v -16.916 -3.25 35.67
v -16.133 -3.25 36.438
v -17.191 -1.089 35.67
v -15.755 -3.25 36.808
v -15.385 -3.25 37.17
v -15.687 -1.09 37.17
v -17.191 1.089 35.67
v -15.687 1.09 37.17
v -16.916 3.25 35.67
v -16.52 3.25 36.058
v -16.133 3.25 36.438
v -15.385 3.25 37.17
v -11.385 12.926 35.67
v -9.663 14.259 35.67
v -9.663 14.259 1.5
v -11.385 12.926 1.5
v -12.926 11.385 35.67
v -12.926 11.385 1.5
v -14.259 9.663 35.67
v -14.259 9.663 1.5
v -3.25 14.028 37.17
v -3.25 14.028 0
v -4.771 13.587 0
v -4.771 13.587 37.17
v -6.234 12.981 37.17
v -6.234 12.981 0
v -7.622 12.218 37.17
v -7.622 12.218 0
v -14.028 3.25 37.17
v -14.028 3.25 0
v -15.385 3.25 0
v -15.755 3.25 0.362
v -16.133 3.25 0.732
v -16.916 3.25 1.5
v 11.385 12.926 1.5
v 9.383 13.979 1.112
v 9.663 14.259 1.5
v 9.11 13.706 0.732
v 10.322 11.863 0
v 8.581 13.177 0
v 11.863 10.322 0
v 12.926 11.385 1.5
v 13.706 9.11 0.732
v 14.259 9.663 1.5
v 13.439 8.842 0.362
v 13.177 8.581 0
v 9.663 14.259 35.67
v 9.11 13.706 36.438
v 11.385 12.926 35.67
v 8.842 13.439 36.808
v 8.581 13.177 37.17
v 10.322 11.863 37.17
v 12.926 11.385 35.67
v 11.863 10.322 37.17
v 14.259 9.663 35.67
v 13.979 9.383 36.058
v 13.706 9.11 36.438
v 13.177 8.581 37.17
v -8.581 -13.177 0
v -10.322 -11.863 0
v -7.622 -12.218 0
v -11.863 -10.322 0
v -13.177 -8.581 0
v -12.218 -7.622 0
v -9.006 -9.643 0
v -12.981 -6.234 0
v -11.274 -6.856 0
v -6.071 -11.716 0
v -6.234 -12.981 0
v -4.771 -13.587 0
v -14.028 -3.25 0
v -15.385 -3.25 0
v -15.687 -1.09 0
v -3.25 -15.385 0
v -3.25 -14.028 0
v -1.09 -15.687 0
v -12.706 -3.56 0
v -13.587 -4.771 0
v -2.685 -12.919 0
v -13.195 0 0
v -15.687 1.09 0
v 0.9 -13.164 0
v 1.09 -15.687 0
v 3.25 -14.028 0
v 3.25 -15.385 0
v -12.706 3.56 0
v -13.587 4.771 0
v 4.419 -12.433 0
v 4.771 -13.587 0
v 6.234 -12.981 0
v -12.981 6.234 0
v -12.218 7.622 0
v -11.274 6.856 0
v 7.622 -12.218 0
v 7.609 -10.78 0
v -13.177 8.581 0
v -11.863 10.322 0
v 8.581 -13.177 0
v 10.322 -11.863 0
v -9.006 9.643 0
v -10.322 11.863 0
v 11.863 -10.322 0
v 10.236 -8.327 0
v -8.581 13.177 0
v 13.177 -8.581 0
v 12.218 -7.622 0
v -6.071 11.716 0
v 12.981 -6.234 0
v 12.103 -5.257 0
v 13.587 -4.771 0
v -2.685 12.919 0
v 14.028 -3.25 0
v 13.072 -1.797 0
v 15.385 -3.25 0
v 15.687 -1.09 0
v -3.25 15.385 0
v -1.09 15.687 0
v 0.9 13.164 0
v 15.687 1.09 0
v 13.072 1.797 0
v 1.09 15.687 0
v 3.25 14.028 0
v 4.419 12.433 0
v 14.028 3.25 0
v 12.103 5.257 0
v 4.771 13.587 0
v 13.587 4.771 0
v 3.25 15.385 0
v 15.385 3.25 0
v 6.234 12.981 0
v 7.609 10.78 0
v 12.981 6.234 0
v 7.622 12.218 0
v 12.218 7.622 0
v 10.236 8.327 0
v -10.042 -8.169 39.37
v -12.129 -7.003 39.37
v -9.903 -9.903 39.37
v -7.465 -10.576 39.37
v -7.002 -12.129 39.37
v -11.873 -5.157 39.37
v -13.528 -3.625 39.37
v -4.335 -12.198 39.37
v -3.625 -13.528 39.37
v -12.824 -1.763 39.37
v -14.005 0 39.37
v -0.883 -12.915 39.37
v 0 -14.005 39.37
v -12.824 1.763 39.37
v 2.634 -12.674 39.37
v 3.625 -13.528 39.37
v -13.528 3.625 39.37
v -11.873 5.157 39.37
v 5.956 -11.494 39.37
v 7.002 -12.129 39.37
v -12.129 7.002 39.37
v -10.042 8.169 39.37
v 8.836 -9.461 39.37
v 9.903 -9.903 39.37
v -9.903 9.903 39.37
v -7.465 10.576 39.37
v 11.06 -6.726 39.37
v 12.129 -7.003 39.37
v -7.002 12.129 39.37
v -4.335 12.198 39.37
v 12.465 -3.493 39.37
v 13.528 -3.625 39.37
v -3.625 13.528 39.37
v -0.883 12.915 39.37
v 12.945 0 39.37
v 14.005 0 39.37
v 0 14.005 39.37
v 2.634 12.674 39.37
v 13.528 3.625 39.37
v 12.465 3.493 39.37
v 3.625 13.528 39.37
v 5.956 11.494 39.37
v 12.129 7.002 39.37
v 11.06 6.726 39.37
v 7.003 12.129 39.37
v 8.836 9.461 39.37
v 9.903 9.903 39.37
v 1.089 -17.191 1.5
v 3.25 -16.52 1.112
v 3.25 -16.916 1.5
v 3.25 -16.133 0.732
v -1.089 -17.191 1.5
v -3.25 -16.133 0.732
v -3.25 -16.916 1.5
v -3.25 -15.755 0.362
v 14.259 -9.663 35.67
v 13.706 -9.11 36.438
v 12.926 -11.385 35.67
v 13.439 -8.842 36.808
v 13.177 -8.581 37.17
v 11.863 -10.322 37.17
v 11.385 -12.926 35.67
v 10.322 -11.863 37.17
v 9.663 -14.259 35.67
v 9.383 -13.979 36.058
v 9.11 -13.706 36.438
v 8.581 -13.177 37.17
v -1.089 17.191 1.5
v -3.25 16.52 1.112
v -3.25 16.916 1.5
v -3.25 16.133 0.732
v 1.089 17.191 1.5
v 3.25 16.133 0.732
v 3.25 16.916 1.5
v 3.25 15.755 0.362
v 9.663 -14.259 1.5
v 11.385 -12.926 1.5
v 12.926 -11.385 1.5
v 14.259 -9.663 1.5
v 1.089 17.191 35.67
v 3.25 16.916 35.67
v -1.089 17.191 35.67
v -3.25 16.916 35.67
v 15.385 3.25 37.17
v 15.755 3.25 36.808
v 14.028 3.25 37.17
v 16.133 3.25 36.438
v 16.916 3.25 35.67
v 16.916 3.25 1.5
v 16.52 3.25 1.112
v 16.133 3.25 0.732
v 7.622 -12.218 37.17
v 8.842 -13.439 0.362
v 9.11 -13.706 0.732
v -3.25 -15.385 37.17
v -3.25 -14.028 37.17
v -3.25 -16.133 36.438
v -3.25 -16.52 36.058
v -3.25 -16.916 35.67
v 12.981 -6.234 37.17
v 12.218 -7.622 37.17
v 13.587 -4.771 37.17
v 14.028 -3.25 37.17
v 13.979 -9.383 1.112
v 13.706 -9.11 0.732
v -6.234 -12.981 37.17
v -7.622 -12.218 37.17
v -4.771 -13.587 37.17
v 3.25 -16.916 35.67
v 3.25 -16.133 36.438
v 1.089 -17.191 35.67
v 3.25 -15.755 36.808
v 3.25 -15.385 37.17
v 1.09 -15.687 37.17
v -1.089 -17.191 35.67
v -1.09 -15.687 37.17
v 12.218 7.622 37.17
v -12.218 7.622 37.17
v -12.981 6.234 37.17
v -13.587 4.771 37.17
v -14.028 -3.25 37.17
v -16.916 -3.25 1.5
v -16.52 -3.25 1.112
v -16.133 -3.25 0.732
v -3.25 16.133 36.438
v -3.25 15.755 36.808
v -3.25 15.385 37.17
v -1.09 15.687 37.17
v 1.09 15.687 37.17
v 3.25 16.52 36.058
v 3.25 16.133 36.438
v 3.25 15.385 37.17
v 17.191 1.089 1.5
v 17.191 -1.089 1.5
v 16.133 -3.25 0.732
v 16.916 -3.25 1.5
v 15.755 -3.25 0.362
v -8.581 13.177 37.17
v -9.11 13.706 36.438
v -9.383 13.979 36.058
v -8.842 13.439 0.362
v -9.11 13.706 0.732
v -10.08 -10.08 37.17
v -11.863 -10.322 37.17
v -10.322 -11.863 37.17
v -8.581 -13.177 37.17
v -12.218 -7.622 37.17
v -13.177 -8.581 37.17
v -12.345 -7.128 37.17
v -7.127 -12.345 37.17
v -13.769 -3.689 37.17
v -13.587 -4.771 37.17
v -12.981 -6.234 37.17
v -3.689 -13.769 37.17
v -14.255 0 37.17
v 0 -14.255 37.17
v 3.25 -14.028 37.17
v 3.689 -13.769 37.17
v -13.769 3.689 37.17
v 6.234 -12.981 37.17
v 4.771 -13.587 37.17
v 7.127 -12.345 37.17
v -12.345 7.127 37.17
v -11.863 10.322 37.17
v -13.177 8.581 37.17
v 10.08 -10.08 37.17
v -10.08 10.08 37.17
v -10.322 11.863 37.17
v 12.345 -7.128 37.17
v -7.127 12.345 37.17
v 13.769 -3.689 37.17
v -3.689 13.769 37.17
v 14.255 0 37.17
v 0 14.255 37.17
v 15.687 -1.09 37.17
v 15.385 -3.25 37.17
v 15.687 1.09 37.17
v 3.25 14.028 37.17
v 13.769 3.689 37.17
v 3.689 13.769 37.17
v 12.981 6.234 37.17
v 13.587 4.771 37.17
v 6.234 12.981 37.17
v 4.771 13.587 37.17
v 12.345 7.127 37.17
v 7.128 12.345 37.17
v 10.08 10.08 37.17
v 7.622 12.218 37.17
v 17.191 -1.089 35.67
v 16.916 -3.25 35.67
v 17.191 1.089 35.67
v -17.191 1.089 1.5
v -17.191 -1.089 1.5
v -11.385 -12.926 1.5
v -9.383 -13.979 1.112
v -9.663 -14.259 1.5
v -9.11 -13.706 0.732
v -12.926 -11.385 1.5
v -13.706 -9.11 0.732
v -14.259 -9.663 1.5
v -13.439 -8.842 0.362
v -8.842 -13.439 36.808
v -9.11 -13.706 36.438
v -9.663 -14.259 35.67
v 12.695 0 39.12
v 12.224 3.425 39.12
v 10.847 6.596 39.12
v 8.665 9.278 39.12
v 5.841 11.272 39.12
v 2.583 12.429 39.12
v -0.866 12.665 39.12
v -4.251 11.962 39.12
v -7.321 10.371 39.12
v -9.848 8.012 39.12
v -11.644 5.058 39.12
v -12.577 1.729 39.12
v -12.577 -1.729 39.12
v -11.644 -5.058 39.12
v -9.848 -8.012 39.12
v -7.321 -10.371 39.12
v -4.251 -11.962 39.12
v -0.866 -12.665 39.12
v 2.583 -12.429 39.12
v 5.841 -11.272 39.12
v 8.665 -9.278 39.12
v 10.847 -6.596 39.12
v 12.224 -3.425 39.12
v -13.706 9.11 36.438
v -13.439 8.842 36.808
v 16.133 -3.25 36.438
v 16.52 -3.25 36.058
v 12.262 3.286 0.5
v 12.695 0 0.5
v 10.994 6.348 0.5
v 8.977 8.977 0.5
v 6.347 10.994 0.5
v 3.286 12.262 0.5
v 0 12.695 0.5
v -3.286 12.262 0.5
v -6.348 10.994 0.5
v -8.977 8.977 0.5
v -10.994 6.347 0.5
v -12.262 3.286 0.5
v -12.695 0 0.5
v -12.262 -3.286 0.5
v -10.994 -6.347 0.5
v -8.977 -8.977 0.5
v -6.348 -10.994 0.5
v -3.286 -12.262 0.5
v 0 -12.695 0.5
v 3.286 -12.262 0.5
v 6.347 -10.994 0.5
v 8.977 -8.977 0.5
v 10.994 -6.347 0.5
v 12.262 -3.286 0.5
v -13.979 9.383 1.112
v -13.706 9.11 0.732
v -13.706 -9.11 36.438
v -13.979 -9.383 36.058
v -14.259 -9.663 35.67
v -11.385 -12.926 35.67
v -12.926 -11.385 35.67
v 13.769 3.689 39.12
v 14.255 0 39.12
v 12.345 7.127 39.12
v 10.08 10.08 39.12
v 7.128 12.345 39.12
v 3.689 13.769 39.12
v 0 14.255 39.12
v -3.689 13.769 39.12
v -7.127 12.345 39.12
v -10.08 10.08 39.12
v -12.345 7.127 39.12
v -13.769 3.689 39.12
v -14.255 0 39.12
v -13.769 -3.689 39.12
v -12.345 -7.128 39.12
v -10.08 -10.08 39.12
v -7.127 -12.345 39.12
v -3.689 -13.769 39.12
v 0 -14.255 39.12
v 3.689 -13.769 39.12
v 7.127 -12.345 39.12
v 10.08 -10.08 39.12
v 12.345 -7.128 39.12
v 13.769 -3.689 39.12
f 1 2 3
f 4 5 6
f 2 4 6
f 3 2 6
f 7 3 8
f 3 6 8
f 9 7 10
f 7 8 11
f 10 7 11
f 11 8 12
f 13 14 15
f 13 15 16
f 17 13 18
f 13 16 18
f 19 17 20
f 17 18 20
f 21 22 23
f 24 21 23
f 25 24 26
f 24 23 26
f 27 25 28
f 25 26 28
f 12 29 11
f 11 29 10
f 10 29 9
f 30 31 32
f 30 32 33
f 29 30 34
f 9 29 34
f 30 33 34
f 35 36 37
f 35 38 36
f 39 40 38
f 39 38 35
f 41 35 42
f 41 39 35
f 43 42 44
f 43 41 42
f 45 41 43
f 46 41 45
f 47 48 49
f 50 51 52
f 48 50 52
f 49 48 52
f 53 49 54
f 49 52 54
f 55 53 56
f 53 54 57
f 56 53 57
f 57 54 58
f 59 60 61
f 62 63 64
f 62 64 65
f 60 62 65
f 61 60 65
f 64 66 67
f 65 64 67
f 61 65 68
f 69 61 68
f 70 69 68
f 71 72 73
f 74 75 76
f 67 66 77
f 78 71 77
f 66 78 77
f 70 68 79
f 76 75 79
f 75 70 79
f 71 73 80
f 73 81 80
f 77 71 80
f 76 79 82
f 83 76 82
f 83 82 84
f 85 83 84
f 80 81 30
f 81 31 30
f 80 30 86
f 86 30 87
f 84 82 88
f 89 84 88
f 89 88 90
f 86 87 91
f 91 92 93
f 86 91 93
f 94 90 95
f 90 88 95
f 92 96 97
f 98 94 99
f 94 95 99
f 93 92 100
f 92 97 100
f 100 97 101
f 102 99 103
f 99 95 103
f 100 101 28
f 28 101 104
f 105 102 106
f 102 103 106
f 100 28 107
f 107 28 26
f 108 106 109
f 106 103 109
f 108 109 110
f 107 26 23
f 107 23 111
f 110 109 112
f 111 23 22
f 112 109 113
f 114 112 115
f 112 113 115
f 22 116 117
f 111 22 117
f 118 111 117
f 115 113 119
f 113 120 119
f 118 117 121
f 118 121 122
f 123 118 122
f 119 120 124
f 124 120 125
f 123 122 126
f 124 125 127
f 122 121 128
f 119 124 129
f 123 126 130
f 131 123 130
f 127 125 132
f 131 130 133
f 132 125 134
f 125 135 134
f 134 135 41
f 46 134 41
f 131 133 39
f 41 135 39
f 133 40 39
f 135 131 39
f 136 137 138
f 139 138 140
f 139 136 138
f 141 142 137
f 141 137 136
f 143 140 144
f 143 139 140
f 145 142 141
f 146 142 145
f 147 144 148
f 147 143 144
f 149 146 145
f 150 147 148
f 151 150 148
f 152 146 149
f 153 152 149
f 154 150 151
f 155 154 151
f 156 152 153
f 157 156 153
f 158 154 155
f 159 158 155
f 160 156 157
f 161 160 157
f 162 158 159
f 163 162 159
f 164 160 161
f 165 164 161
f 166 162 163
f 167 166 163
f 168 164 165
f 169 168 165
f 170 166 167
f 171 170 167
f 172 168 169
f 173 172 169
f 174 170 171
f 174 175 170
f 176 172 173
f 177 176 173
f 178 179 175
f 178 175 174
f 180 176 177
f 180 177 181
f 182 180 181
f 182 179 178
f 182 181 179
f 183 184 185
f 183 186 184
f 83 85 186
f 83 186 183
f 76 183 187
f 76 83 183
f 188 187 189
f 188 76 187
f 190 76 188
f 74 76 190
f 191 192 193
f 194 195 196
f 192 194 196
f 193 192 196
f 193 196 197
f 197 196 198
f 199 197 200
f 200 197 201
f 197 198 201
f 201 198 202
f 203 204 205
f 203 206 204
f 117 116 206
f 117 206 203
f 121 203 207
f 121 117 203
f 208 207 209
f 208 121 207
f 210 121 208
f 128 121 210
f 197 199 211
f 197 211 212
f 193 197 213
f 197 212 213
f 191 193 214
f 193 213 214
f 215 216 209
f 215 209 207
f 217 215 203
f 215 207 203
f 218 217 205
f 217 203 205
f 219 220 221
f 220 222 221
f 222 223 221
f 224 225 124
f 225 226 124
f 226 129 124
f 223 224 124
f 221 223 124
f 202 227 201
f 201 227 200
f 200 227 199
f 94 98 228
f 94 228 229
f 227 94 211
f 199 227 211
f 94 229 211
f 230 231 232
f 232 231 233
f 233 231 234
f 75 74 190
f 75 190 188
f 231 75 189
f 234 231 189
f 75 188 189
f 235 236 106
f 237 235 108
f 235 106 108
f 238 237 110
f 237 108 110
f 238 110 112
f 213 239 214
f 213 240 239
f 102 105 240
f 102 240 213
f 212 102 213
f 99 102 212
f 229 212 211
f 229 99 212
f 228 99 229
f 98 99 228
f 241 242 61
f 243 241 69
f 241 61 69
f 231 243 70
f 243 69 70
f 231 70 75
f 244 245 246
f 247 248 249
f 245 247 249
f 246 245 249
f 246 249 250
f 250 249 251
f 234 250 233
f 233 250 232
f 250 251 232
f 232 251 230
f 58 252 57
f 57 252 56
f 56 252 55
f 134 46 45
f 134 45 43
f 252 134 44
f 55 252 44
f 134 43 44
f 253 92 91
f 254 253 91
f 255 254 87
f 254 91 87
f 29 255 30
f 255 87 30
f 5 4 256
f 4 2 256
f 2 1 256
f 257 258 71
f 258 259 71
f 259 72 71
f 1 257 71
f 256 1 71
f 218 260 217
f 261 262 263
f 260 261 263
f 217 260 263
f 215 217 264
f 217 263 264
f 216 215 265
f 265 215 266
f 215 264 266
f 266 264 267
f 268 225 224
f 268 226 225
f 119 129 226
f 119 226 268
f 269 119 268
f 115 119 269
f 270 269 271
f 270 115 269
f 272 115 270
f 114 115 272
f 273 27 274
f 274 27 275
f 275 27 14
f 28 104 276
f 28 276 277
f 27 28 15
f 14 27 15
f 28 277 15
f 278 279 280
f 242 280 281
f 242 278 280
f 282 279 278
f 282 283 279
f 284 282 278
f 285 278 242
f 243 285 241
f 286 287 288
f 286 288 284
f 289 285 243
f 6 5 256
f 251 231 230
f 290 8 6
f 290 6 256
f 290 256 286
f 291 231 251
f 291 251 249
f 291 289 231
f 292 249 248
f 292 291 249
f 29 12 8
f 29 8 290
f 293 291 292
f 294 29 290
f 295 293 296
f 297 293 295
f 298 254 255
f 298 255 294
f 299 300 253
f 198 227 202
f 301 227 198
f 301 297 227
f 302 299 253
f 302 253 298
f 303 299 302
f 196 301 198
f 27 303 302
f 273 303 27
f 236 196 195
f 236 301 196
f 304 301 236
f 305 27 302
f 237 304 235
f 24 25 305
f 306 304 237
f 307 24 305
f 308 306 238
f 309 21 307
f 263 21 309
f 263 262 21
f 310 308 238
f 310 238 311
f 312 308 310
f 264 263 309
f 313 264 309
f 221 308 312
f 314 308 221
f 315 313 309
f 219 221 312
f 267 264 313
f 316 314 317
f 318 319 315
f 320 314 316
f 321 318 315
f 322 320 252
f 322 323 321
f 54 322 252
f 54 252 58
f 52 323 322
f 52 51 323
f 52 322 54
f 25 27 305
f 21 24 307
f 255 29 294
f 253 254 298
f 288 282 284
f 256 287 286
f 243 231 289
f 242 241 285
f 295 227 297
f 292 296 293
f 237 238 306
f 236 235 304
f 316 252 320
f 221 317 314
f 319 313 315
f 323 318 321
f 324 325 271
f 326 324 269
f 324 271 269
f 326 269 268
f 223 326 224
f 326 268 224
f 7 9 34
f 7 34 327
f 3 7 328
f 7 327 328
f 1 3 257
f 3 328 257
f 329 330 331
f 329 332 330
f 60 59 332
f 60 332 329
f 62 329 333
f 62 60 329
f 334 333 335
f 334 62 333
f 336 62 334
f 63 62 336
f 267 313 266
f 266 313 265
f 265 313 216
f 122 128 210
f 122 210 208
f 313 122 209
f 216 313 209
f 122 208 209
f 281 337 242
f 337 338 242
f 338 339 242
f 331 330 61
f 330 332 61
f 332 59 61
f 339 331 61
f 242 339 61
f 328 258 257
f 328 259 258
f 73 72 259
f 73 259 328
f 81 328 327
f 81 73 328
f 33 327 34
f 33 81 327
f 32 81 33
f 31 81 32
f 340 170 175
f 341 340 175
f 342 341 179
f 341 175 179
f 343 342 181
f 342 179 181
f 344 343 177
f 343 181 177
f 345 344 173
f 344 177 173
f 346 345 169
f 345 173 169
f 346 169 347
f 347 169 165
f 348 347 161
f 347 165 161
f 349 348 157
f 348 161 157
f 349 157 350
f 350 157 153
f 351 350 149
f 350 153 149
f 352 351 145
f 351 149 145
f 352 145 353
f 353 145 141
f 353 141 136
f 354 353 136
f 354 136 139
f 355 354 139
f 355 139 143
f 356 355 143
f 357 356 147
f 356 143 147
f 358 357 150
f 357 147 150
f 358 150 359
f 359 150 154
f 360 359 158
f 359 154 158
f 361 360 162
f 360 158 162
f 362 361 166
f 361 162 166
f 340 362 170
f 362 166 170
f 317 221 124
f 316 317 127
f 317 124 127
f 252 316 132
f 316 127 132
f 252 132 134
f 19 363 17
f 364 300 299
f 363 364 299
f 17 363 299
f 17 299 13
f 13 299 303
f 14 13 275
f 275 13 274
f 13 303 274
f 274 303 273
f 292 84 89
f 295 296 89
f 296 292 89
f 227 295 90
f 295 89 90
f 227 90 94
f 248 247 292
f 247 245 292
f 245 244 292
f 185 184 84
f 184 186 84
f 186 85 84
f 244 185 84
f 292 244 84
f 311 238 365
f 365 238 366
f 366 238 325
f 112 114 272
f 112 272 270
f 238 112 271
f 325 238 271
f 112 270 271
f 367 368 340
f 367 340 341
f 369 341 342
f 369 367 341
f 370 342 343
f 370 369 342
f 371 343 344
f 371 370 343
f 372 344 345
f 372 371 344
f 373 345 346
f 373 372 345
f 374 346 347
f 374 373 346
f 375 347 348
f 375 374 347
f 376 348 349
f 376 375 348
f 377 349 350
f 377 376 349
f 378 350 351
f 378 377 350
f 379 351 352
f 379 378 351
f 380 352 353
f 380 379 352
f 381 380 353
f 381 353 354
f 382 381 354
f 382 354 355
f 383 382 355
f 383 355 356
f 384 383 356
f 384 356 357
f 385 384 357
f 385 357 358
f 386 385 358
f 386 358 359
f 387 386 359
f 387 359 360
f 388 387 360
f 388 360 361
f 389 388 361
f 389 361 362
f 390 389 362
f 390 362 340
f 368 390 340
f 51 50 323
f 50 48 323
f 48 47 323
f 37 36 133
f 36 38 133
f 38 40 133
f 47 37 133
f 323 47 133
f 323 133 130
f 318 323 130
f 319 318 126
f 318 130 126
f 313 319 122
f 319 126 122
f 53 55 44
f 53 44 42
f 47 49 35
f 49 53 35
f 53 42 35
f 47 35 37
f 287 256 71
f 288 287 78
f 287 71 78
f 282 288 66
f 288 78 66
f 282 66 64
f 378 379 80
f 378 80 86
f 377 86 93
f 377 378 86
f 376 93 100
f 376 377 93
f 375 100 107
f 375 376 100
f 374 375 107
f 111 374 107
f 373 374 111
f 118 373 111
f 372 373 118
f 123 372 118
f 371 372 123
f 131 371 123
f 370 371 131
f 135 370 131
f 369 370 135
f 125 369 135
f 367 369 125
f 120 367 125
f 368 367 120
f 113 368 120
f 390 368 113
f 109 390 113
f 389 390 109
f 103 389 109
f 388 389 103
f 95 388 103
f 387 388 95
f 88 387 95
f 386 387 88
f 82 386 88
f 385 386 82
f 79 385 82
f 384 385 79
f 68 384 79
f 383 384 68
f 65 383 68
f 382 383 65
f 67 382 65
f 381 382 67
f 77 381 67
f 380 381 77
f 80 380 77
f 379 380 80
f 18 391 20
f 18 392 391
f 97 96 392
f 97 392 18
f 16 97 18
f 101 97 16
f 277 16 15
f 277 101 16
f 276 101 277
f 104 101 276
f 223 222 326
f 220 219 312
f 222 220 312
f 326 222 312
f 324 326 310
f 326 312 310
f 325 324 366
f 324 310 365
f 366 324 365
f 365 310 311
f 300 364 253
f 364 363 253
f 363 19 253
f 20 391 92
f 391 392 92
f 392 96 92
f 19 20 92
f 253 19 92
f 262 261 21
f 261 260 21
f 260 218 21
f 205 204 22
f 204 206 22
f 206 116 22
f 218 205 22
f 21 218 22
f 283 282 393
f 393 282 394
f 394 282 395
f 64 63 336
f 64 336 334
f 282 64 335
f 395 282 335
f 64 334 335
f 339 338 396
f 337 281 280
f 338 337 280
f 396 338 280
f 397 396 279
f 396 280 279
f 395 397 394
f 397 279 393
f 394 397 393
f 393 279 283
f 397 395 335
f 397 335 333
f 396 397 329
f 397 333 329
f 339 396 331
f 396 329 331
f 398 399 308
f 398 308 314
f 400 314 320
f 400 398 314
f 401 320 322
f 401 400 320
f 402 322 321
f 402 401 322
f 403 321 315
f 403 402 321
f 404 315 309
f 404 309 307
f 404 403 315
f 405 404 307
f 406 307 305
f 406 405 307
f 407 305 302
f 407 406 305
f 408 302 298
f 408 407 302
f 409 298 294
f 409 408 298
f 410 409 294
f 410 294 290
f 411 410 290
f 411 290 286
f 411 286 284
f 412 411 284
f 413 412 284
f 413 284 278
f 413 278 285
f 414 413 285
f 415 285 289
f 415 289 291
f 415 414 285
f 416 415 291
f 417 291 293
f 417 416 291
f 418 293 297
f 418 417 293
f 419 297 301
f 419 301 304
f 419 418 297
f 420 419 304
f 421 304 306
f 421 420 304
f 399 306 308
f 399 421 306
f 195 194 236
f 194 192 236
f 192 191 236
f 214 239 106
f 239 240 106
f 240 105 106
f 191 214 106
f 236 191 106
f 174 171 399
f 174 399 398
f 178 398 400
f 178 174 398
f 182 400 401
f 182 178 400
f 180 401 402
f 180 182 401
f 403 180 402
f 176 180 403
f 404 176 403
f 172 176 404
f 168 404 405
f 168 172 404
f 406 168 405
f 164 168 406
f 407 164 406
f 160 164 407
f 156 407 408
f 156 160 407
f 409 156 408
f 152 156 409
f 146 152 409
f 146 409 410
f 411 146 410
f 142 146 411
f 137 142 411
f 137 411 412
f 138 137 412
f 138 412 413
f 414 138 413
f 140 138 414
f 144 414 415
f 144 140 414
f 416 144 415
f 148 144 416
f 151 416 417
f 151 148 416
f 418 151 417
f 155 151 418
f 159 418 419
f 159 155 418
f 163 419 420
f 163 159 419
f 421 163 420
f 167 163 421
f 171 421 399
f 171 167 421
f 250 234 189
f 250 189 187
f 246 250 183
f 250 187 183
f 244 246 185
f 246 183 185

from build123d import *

# Parameters (mm, degrees)
SKETCH1_R           = 14.4
SKETCH1_R_2         = 12.695
BOSS_EXTRUDE1_DEPTH = 39.37
BOSS_EXTRUDE2_START = -39.37
BOSS_EXTRUDE2_DEPTH = 39.37
CIRPATTERN1_COUNT   = 8
SKETCH3_OUTSIDE_W   = 48.978
SKETCH3_OUTSIDE_H   = 48.978
SKETCH3_OUTSIDE_R   = 14.255
CUT_EXTRUDE1_DEPTH  = 2.2
CHAMFER2_SIZE       = 0.25


with BuildPart() as part:
    # Sketch1 → Boss-Extrude1 (new body)
    with BuildSketch(Plane.XY):
        Circle(SKETCH1_R)
        Circle(SKETCH1_R_2, mode=Mode.SUBTRACT)
    extrude(amount=BOSS_EXTRUDE1_DEPTH)

    # Sketch2 → Boss-Extrude2 (add)
    with BuildSketch(Plane.XY.offset(39.37).offset(BOSS_EXTRUDE2_START)):
        with BuildLine():
            Line((-3.25, 16.915617784), (-3.25, 14.028453229))
            ThreePointArc((-3.25, 14.028453229), (0, 14.4), (3.25, 14.028453229))
            Line((3.25, 14.028453229), (3.25, 16.915617784))
            ThreePointArc((3.25, 16.915617784), (0, 17.225), (-3.25, 16.915617784))
        make_face()
    boss_extrude2 = extrude(amount=BOSS_EXTRUDE2_DEPTH)

    # CirPattern1: Boss-Extrude2 ×8 about axis
    cirpattern1_axis = Axis((0, 0, 0), (0, 0, 1))
    for i in range(1, CIRPATTERN1_COUNT):
        add(boss_extrude2.rotate(cirpattern1_axis, i * 360 / CIRPATTERN1_COUNT))

    # Sketch3 outside → Cut-Extrude1 (cut)
    with BuildSketch(Plane.XY.offset(39.37)):
        Rectangle(SKETCH3_OUTSIDE_W, SKETCH3_OUTSIDE_H)
        Circle(SKETCH3_OUTSIDE_R, mode=Mode.SUBTRACT)
    extrude(amount=-CUT_EXTRUDE1_DEPTH, mode=Mode.SUBTRACT)

    # Sketch5 → Cut-Revolve1 (revolve, cut)
    with BuildSketch(Plane(origin=(0, 0, 0), x_dir=(0, 0, -1), z_dir=(1, 0, 0))):
        Polygon((-35.67, 17.225), (-37.17, 15.725), (-37.17, 17.225), align=None)
        Polygon((0, 17.225), (-1.5, 17.225), (0, 15.725), align=None)
    revolve(axis=Axis((0, 0, 0), (0, 0, -1)), mode=Mode.SUBTRACT)

    # Sketch8 → Cut-Revolve2 (revolve, cut)
    with BuildSketch(Plane(origin=(0, 0, 0), x_dir=(1, 0, 0), z_dir=(0, 1, 0))):
        Polygon((-8.195, -5), (-8.195, 0), (-12.695, 0), (-12.695, -0.5), align=None)
        Polygon((-12.695, -0.5), (-12.695, 0), (-13.195, 0), align=None)
    revolve(axis=Axis((0, 0, 0), (0, 0, -1)), mode=Mode.SUBTRACT)

    # Chamfer2
    chamfer2_edges = [part.edges().sort_by_distance(p)[0] for p in [
        (-14.255, 0, 39.37),
        (-12.695, 0, 39.37),
    ]]
    chamfer(chamfer2_edges, length=CHAMFER2_SIZE)


solid = part.part
